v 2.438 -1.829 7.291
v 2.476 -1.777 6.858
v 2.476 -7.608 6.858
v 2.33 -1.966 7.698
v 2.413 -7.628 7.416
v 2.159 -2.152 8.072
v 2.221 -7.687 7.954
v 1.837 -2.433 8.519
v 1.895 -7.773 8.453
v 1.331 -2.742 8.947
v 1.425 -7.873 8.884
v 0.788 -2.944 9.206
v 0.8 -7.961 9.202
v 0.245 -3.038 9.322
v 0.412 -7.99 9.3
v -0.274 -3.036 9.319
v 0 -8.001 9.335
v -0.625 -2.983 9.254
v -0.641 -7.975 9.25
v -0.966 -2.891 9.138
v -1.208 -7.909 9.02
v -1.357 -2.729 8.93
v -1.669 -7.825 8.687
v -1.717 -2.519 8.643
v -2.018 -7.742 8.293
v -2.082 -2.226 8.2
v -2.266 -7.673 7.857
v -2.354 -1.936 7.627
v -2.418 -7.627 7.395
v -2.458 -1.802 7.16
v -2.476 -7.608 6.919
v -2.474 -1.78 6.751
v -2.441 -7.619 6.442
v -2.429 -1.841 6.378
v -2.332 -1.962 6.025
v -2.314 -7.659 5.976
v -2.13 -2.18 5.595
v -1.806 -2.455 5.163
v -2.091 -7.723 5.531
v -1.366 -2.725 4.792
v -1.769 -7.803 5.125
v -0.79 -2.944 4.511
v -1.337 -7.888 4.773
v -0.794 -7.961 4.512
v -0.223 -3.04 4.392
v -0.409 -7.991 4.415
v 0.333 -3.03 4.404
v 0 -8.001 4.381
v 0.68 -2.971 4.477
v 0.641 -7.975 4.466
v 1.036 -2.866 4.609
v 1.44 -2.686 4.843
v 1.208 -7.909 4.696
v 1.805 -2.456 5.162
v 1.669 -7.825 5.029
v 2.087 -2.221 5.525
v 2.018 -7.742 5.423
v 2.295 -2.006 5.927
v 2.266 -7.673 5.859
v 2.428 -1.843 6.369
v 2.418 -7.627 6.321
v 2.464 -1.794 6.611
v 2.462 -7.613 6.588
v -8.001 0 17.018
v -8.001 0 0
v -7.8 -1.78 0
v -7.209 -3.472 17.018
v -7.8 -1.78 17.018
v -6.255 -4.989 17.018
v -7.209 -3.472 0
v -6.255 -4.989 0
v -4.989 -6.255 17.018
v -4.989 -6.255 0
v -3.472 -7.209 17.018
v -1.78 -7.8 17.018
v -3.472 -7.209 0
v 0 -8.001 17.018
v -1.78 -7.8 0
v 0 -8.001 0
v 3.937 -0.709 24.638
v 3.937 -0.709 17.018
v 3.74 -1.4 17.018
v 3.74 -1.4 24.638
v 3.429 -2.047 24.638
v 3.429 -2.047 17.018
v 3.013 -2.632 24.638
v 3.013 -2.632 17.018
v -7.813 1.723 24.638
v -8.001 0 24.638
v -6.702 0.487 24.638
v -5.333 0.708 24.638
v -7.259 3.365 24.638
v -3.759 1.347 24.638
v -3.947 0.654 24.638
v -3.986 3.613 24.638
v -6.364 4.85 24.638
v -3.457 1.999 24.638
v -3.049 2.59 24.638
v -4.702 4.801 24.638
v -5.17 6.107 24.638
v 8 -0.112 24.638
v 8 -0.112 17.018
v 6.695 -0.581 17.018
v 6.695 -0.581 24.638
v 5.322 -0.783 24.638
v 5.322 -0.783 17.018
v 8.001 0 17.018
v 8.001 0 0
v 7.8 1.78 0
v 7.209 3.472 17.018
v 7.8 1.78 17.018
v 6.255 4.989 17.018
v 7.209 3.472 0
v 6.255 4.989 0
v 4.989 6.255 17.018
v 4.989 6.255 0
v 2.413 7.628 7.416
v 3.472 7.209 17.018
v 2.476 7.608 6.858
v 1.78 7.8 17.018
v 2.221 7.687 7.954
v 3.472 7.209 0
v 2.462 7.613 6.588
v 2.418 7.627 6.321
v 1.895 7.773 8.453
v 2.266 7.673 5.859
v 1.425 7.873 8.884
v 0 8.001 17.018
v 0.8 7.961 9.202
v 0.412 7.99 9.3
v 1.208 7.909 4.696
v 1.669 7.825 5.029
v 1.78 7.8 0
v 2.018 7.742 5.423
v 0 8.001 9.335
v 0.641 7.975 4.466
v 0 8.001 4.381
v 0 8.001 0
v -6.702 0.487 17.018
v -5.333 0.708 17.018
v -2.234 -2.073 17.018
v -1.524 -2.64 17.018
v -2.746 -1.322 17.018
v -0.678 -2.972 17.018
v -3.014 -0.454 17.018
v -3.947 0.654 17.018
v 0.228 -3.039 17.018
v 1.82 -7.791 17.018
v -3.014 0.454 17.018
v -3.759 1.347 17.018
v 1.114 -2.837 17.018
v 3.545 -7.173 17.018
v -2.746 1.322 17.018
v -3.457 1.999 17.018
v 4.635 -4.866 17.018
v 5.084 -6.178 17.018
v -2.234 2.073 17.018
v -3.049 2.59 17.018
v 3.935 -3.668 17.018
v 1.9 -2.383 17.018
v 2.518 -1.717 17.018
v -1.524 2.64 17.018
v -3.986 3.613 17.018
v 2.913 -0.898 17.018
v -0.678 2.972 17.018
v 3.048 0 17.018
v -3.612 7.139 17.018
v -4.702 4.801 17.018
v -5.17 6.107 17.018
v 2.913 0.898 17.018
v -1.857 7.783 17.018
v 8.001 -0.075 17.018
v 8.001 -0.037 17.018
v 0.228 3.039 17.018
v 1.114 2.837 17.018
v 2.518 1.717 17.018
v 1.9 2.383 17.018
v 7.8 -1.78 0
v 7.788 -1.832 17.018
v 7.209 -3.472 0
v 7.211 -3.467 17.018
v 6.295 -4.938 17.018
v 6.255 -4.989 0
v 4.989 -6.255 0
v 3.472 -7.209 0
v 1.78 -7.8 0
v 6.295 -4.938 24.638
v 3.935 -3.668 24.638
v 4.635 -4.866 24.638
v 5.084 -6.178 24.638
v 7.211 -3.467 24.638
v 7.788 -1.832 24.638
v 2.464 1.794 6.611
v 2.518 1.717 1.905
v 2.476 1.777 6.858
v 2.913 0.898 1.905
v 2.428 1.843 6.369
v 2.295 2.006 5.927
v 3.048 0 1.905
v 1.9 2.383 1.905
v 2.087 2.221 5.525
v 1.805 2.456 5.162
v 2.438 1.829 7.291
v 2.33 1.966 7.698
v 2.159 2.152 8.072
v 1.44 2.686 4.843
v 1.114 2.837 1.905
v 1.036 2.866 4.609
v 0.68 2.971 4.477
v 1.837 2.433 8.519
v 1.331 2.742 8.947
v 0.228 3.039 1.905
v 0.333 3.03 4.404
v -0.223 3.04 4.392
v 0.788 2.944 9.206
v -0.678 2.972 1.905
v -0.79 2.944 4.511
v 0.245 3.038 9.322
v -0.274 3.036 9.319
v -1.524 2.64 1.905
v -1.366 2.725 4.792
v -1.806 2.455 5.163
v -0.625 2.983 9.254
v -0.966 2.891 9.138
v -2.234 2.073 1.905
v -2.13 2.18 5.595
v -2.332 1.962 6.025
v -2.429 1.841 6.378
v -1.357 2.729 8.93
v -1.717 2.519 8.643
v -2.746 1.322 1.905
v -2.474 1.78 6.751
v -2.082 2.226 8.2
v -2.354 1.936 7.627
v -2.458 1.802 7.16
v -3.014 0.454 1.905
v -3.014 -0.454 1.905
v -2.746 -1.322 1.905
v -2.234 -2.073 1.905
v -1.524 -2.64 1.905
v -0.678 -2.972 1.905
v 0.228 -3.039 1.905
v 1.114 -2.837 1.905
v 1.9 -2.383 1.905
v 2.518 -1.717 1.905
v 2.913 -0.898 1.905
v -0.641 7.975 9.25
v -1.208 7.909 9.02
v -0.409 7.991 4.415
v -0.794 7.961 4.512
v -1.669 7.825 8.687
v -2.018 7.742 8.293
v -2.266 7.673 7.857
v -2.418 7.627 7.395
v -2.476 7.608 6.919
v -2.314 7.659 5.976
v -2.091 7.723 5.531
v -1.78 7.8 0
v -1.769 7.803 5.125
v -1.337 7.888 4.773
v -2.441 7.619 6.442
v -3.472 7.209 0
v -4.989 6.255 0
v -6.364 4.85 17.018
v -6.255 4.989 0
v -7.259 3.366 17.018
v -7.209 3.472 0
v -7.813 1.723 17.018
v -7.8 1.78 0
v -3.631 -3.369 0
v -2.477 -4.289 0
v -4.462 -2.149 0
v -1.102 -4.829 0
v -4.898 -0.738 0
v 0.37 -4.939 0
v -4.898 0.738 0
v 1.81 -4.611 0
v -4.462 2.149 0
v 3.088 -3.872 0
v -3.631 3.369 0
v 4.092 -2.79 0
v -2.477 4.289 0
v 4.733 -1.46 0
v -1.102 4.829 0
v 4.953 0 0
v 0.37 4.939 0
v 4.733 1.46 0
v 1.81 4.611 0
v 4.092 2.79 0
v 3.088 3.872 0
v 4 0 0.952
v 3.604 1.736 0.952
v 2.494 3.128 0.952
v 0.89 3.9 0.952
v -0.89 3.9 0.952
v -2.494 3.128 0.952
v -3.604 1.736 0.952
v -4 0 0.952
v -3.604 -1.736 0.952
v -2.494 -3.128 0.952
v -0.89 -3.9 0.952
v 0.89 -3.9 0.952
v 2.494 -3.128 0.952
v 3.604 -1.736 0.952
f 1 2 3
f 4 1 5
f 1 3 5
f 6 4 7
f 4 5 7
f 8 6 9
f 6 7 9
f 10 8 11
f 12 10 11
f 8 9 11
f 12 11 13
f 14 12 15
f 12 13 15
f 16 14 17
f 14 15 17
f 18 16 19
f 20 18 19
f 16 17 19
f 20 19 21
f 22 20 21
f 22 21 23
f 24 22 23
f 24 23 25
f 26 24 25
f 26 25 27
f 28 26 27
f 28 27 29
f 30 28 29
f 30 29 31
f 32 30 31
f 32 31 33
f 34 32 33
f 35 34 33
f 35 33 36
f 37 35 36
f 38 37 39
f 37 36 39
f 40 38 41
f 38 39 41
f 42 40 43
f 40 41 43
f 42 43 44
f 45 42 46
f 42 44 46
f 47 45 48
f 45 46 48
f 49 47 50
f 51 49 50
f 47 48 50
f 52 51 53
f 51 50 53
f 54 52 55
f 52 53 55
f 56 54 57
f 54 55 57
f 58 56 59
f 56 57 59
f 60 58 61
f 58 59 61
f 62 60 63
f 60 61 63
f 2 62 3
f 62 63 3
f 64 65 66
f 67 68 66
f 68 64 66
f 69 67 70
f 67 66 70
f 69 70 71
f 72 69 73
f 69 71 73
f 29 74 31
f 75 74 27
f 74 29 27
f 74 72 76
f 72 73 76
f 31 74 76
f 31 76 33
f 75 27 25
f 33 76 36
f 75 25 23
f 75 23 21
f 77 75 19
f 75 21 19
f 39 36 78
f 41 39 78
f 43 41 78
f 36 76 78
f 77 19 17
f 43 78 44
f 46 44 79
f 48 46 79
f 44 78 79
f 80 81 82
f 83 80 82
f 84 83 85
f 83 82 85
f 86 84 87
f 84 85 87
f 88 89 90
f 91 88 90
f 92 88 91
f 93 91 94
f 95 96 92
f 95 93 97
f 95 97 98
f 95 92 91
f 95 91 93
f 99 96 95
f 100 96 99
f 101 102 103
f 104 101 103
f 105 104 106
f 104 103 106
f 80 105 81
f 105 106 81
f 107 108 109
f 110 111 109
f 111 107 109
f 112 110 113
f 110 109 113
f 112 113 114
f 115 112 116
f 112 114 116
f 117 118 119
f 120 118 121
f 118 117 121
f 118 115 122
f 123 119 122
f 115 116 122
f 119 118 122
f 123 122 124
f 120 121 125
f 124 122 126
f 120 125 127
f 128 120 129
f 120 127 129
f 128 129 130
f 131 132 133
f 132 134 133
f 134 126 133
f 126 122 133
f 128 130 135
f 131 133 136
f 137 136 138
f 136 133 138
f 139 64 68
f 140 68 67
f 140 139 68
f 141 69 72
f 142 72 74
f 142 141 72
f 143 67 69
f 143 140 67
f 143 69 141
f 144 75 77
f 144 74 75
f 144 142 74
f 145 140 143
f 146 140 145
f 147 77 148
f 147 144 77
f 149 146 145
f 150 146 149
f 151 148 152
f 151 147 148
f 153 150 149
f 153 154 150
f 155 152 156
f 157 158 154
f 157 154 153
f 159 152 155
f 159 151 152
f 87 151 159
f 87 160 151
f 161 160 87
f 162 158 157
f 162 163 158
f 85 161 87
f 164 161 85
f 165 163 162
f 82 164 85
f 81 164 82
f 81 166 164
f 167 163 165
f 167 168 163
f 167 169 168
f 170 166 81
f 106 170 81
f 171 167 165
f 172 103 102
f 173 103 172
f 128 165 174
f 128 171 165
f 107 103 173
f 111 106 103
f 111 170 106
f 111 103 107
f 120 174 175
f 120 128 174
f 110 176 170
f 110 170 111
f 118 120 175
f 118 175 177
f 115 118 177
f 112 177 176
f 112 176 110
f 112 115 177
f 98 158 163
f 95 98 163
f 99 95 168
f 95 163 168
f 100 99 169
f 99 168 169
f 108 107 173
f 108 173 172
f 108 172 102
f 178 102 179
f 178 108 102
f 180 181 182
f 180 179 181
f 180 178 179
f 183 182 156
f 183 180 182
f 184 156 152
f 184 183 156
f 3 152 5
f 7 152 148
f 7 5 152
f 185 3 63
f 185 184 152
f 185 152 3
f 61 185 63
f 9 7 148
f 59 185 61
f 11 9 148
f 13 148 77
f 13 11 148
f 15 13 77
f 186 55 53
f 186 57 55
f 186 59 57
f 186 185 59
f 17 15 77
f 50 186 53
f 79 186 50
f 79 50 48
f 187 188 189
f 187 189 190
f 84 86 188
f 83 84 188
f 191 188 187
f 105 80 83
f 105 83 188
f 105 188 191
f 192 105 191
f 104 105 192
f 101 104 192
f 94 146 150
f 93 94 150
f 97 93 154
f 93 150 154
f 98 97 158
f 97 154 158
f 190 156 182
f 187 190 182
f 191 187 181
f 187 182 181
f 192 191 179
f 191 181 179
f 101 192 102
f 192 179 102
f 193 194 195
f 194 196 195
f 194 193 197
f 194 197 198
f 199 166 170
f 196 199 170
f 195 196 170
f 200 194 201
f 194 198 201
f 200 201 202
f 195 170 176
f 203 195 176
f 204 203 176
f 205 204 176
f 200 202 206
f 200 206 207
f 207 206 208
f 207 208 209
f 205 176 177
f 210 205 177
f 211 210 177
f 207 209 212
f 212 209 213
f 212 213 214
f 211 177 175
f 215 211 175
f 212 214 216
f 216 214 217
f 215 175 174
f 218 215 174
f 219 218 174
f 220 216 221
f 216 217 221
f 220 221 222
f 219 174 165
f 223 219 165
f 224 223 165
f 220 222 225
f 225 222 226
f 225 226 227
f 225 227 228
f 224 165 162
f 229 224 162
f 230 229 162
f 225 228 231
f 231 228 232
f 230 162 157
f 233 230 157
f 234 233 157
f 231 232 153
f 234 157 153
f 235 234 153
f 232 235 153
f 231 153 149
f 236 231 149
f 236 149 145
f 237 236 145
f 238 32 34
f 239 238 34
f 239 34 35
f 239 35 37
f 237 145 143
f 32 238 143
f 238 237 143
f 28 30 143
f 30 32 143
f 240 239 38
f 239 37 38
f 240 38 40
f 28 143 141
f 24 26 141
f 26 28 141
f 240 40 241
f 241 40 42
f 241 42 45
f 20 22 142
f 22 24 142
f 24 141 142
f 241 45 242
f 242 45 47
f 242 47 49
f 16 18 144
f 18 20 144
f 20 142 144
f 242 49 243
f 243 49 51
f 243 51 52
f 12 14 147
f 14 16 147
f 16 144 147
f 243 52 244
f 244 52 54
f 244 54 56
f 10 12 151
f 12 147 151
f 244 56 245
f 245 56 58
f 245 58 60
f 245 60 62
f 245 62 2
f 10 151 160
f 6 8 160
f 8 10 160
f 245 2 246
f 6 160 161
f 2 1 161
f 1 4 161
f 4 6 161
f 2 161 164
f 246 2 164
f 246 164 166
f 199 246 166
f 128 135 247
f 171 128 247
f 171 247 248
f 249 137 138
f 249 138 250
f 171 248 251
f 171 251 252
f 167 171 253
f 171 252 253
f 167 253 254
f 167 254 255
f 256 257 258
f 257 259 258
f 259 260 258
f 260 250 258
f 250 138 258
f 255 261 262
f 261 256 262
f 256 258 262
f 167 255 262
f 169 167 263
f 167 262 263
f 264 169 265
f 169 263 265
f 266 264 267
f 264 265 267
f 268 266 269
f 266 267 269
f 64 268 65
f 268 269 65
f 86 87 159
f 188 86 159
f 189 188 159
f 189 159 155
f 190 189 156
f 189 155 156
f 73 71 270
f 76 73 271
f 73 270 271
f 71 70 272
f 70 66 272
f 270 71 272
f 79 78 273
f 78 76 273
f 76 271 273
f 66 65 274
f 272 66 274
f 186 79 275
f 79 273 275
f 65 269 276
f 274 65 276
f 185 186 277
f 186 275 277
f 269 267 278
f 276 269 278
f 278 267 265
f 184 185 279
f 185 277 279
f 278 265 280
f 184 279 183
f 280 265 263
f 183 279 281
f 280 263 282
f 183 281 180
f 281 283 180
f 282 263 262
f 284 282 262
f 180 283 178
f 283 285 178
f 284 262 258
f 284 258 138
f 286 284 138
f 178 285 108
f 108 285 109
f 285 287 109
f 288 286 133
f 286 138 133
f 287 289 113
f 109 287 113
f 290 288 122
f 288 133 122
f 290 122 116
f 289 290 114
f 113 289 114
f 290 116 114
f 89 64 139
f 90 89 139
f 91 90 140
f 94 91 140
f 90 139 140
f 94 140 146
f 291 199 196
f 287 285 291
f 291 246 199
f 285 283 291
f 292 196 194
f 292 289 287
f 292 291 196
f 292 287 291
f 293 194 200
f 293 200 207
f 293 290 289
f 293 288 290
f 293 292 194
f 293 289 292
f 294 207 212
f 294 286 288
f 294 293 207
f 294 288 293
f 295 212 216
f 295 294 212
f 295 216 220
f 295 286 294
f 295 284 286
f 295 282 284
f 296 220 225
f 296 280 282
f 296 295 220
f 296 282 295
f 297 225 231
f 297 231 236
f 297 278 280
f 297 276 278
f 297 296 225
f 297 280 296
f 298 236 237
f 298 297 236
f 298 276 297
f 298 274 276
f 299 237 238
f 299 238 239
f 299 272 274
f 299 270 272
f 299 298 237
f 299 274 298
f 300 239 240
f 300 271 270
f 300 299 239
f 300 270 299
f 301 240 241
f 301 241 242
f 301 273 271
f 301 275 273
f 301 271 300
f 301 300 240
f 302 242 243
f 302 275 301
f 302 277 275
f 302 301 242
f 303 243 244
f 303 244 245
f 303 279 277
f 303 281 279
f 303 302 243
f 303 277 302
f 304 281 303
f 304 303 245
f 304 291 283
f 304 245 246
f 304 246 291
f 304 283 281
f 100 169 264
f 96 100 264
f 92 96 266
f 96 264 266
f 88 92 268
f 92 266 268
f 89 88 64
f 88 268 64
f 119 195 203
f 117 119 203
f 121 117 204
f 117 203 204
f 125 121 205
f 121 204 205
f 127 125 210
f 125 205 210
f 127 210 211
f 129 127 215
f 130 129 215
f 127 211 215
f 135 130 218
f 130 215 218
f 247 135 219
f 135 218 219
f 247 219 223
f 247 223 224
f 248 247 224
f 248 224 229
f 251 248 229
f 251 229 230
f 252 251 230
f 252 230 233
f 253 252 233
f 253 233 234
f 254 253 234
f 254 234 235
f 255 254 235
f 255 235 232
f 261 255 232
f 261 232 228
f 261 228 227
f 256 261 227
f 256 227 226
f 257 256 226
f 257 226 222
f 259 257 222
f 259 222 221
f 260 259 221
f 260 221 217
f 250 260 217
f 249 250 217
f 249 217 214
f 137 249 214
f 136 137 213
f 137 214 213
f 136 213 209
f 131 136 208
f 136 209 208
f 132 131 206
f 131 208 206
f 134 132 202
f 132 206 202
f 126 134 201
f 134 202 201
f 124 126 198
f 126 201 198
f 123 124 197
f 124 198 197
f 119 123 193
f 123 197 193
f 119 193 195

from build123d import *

# Parameters (mm, degrees)
F0_R        = 8.001
F0_R_2      = 3.048
F1_DEPTH    = 17.018
F3_W        = 16.002
F3_H        = 16.002
F4_DEPTH    = 17.018
F5_R        = 2.4765
F6_DEPTH    = 25.4
F7_T1_DEPTH = 57.023
F2_R        = 3.048
F8_DEPTH    = 25.4
F10_DEPTH   = 7.62
F11_SIZE    = 1.905


# Not quite as in the source:
# - a fillet or chamfer that OpenCascade refuses, or shapes differently, is made with other operations: its cross-section is extruded or revolved along the edge and cut away or added


with BuildPart() as f1:
    # F0 (on Top) → F1 (new body)
    with BuildSketch(Plane.XY):
        Circle(F0_R)
        Circle(F0_R_2, mode=Mode.SUBTRACT)
    extrude(amount=F1_DEPTH)

    # F3 (on Top) → F4 (join)
    with BuildSketch(Plane.XY):
        Rectangle(F3_W, F3_H)
    extrude(amount=F4_DEPTH)

    # F5 (on face) → F6 (cut)
    with BuildSketch(Plane.XZ.offset(8.001)):
        with Locations((0, 6.858)):
            Circle(F5_R)
    extrude(amount=-F6_DEPTH, mode=Mode.SUBTRACT)

    # F7: fillet of radius 8.001 on 4 edges, made by hand

    # F7_s2 → F7_t1 (cut)
    with BuildSketch(Plane.XY.offset(-20.0025)):
        with BuildLine():
            ThreePointArc((8.001, 0), (5.6575613563, -5.6575613563), (0, -8.001))
            Line((0, -8.001), (8.001, -8.001))
            Line((8.001, -8.001), (8.001, 0))
        make_face()
        with BuildLine():
            ThreePointArc((8.001, 0), (5.6575613563, 5.6575613563), (0, 8.001))
            Line((0, 8.001), (8.001, 8.001))
            Line((8.001, 8.001), (8.001, 0))
        make_face()
        with BuildLine():
            ThreePointArc((-8.001, 0), (-5.6575613563, -5.6575613563), (0, -8.001))
            Line((0, -8.001), (-8.001, -8.001))
            Line((-8.001, -8.001), (-8.001, 0))
        make_face()
        with BuildLine():
            ThreePointArc((0, 8.001), (-5.6575613563, 5.6575613563), (-8.001, 0))
            Line((-8.001, 0), (-8.001, 8.001))
            Line((-8.001, 8.001), (0, 8.001))
        make_face()
    extrude(amount=F7_T1_DEPTH, mode=Mode.SUBTRACT)

    # F2 (on face) → F8 (cut)
    with BuildSketch(Plane.XY.offset(17.018)):
        Circle(F2_R)
    extrude(amount=-F8_DEPTH, mode=Mode.SUBTRACT)

    # F9 (on face) → F10 (join)
    with BuildSketch(Plane.XY.offset(17.018)):
        with BuildLine():
            ThreePointArc((-3.0492599206, 2.589597302), (-4.3737921452, 4.1887242953), (-5.1697063492, 6.1065650953))
            ThreePointArc((-5.1697063492, 6.1065650953), (-7.2587471887, 3.3655), (-8.001, 0))
            ThreePointArc((-8.001, 0), (-6.0229894511, 0.6317175182), (-3.9466720244, 0.6540490669))
            ThreePointArc((-3.9466720244, 0.6540490669), (-3.6217185151, 1.6792007416), (-3.0492599206, 2.589597302))
        make_face()
        with BuildLine():
            ThreePointArc((3.0127388708, -2.6319963424), (4.3147732675, -4.2494941582), (5.0837832604, -6.1782804049))
            ThreePointArc((5.0837832604, -6.1782804049), (7.2109611489, -3.4667045316), (8.0002172314, -0.1119162637))
            ThreePointArc((8.0002172314, -0.1119162637), (6.0135638704, -0.7159039933), (3.9371372089, -0.7091902765))
            ThreePointArc((3.9371372089, -0.7091902765), (3.5978758903, -1.729696277), (3.0127388708, -2.6319963424))
        make_face()
    extrude(amount=F10_DEPTH)

    # F11
    f11_edges = [f1.edges().sort_by_distance(p)[0] for p in [
        (-3.048, 0, 0),
    ]]
    chamfer(f11_edges, length=F11_SIZE)


solid = f1.part
